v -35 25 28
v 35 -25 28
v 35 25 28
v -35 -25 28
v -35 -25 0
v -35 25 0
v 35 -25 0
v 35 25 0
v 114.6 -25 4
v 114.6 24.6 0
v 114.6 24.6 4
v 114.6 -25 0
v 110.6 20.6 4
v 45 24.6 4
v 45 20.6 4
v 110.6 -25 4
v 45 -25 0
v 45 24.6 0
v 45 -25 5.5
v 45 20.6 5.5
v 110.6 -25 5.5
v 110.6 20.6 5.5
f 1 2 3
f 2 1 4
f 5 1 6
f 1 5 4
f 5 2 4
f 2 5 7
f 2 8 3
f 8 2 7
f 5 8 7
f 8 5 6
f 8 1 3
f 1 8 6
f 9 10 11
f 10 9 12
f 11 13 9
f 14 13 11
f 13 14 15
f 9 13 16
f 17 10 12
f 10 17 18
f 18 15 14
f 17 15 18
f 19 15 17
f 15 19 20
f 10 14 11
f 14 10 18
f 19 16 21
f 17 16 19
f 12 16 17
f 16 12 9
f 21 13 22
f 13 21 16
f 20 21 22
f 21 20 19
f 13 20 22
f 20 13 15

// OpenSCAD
// Two-part enclosure for a small electronics board (e.g. Arduino-based temperature logger)
// Print orientation: box standing on the bed, lid printed upside down on the +X side

// ---------- Parameters ----------
box_x      = 70;    // box outer size in X (mm)
box_y      = 50;    // box outer size in Y (mm)
box_z      = 30;    // box outer size in Z (mm)
box_wall   = 2;     // box wall thickness (mm)
box_floor  = 2;     // box floor thickness (mm)

lip_x      = 65.6;  // lip outer size in X (mm)
lip_y      = 45.6;  // lip outer size in Y (mm)
lip_t      = 1.5;   // lip wall thickness (mm)
lip_h      = 4;     // lip height above plate (mm)

eps        = 0.5;   // cutter overshoot past faces (mm)
gap        = 10;    // gap between box and lid on the bed (mm)

$fn = 64;

// ---------- Derived ----------
box_h = box_z - box_wall;              // 28 mm open top height
lip_x2 = lip_x + 2 * box_wall;         // 74 mm (lip outer + walls on each side)
lip_y2 = lip_y + 2 * box_wall;         // 54 mm (lip outer + walls on each side)

// ---------- Model ----------
union() {
    // Box: outer block with hollow body, open top
    translate([-box_x / 2, -box_y / 2, 0])
        cube([box_x, box_y, box_h]);

    translate([-box_x / 2, -box_y / 2, box_floor])
        difference() {
            cube([box_x - 2 * box_wall, box_y - 2 * box_wall, box_h - box_floor]);
            translate([-box_x / 2 - eps, -box_y / 2 - eps, -eps])
                cube([box_x - 2 * box_wall + 2 * eps, box_y - 2 * box_wall + 2 * eps, box_h - box_floor + eps]);
        }
    // (solid shell with open top)
    translate([-box_x / 2, -box_y / 2, 0])
        cube([box_x, box_y, box_wall]);
}

// Lid: plate lying on the bed with a rectangular lip on top, centred on the plate
translate([box_x / 2 + gap, -box_y / 2, 0])
    union() {
        translate([0, 0, 0])
            cube([lip_x2, lip_y2, 0]);   // plate (zero thickness, outline)

        translate([0, 0, 0])
            cube([lip_x2, lip_y2, lip_h]);   // lip block

        translate([0, 0, lip_h])
            cube([lip_x, lip_y, lip_t]);         // wall, 0.2 mm clearance on each side
    }
